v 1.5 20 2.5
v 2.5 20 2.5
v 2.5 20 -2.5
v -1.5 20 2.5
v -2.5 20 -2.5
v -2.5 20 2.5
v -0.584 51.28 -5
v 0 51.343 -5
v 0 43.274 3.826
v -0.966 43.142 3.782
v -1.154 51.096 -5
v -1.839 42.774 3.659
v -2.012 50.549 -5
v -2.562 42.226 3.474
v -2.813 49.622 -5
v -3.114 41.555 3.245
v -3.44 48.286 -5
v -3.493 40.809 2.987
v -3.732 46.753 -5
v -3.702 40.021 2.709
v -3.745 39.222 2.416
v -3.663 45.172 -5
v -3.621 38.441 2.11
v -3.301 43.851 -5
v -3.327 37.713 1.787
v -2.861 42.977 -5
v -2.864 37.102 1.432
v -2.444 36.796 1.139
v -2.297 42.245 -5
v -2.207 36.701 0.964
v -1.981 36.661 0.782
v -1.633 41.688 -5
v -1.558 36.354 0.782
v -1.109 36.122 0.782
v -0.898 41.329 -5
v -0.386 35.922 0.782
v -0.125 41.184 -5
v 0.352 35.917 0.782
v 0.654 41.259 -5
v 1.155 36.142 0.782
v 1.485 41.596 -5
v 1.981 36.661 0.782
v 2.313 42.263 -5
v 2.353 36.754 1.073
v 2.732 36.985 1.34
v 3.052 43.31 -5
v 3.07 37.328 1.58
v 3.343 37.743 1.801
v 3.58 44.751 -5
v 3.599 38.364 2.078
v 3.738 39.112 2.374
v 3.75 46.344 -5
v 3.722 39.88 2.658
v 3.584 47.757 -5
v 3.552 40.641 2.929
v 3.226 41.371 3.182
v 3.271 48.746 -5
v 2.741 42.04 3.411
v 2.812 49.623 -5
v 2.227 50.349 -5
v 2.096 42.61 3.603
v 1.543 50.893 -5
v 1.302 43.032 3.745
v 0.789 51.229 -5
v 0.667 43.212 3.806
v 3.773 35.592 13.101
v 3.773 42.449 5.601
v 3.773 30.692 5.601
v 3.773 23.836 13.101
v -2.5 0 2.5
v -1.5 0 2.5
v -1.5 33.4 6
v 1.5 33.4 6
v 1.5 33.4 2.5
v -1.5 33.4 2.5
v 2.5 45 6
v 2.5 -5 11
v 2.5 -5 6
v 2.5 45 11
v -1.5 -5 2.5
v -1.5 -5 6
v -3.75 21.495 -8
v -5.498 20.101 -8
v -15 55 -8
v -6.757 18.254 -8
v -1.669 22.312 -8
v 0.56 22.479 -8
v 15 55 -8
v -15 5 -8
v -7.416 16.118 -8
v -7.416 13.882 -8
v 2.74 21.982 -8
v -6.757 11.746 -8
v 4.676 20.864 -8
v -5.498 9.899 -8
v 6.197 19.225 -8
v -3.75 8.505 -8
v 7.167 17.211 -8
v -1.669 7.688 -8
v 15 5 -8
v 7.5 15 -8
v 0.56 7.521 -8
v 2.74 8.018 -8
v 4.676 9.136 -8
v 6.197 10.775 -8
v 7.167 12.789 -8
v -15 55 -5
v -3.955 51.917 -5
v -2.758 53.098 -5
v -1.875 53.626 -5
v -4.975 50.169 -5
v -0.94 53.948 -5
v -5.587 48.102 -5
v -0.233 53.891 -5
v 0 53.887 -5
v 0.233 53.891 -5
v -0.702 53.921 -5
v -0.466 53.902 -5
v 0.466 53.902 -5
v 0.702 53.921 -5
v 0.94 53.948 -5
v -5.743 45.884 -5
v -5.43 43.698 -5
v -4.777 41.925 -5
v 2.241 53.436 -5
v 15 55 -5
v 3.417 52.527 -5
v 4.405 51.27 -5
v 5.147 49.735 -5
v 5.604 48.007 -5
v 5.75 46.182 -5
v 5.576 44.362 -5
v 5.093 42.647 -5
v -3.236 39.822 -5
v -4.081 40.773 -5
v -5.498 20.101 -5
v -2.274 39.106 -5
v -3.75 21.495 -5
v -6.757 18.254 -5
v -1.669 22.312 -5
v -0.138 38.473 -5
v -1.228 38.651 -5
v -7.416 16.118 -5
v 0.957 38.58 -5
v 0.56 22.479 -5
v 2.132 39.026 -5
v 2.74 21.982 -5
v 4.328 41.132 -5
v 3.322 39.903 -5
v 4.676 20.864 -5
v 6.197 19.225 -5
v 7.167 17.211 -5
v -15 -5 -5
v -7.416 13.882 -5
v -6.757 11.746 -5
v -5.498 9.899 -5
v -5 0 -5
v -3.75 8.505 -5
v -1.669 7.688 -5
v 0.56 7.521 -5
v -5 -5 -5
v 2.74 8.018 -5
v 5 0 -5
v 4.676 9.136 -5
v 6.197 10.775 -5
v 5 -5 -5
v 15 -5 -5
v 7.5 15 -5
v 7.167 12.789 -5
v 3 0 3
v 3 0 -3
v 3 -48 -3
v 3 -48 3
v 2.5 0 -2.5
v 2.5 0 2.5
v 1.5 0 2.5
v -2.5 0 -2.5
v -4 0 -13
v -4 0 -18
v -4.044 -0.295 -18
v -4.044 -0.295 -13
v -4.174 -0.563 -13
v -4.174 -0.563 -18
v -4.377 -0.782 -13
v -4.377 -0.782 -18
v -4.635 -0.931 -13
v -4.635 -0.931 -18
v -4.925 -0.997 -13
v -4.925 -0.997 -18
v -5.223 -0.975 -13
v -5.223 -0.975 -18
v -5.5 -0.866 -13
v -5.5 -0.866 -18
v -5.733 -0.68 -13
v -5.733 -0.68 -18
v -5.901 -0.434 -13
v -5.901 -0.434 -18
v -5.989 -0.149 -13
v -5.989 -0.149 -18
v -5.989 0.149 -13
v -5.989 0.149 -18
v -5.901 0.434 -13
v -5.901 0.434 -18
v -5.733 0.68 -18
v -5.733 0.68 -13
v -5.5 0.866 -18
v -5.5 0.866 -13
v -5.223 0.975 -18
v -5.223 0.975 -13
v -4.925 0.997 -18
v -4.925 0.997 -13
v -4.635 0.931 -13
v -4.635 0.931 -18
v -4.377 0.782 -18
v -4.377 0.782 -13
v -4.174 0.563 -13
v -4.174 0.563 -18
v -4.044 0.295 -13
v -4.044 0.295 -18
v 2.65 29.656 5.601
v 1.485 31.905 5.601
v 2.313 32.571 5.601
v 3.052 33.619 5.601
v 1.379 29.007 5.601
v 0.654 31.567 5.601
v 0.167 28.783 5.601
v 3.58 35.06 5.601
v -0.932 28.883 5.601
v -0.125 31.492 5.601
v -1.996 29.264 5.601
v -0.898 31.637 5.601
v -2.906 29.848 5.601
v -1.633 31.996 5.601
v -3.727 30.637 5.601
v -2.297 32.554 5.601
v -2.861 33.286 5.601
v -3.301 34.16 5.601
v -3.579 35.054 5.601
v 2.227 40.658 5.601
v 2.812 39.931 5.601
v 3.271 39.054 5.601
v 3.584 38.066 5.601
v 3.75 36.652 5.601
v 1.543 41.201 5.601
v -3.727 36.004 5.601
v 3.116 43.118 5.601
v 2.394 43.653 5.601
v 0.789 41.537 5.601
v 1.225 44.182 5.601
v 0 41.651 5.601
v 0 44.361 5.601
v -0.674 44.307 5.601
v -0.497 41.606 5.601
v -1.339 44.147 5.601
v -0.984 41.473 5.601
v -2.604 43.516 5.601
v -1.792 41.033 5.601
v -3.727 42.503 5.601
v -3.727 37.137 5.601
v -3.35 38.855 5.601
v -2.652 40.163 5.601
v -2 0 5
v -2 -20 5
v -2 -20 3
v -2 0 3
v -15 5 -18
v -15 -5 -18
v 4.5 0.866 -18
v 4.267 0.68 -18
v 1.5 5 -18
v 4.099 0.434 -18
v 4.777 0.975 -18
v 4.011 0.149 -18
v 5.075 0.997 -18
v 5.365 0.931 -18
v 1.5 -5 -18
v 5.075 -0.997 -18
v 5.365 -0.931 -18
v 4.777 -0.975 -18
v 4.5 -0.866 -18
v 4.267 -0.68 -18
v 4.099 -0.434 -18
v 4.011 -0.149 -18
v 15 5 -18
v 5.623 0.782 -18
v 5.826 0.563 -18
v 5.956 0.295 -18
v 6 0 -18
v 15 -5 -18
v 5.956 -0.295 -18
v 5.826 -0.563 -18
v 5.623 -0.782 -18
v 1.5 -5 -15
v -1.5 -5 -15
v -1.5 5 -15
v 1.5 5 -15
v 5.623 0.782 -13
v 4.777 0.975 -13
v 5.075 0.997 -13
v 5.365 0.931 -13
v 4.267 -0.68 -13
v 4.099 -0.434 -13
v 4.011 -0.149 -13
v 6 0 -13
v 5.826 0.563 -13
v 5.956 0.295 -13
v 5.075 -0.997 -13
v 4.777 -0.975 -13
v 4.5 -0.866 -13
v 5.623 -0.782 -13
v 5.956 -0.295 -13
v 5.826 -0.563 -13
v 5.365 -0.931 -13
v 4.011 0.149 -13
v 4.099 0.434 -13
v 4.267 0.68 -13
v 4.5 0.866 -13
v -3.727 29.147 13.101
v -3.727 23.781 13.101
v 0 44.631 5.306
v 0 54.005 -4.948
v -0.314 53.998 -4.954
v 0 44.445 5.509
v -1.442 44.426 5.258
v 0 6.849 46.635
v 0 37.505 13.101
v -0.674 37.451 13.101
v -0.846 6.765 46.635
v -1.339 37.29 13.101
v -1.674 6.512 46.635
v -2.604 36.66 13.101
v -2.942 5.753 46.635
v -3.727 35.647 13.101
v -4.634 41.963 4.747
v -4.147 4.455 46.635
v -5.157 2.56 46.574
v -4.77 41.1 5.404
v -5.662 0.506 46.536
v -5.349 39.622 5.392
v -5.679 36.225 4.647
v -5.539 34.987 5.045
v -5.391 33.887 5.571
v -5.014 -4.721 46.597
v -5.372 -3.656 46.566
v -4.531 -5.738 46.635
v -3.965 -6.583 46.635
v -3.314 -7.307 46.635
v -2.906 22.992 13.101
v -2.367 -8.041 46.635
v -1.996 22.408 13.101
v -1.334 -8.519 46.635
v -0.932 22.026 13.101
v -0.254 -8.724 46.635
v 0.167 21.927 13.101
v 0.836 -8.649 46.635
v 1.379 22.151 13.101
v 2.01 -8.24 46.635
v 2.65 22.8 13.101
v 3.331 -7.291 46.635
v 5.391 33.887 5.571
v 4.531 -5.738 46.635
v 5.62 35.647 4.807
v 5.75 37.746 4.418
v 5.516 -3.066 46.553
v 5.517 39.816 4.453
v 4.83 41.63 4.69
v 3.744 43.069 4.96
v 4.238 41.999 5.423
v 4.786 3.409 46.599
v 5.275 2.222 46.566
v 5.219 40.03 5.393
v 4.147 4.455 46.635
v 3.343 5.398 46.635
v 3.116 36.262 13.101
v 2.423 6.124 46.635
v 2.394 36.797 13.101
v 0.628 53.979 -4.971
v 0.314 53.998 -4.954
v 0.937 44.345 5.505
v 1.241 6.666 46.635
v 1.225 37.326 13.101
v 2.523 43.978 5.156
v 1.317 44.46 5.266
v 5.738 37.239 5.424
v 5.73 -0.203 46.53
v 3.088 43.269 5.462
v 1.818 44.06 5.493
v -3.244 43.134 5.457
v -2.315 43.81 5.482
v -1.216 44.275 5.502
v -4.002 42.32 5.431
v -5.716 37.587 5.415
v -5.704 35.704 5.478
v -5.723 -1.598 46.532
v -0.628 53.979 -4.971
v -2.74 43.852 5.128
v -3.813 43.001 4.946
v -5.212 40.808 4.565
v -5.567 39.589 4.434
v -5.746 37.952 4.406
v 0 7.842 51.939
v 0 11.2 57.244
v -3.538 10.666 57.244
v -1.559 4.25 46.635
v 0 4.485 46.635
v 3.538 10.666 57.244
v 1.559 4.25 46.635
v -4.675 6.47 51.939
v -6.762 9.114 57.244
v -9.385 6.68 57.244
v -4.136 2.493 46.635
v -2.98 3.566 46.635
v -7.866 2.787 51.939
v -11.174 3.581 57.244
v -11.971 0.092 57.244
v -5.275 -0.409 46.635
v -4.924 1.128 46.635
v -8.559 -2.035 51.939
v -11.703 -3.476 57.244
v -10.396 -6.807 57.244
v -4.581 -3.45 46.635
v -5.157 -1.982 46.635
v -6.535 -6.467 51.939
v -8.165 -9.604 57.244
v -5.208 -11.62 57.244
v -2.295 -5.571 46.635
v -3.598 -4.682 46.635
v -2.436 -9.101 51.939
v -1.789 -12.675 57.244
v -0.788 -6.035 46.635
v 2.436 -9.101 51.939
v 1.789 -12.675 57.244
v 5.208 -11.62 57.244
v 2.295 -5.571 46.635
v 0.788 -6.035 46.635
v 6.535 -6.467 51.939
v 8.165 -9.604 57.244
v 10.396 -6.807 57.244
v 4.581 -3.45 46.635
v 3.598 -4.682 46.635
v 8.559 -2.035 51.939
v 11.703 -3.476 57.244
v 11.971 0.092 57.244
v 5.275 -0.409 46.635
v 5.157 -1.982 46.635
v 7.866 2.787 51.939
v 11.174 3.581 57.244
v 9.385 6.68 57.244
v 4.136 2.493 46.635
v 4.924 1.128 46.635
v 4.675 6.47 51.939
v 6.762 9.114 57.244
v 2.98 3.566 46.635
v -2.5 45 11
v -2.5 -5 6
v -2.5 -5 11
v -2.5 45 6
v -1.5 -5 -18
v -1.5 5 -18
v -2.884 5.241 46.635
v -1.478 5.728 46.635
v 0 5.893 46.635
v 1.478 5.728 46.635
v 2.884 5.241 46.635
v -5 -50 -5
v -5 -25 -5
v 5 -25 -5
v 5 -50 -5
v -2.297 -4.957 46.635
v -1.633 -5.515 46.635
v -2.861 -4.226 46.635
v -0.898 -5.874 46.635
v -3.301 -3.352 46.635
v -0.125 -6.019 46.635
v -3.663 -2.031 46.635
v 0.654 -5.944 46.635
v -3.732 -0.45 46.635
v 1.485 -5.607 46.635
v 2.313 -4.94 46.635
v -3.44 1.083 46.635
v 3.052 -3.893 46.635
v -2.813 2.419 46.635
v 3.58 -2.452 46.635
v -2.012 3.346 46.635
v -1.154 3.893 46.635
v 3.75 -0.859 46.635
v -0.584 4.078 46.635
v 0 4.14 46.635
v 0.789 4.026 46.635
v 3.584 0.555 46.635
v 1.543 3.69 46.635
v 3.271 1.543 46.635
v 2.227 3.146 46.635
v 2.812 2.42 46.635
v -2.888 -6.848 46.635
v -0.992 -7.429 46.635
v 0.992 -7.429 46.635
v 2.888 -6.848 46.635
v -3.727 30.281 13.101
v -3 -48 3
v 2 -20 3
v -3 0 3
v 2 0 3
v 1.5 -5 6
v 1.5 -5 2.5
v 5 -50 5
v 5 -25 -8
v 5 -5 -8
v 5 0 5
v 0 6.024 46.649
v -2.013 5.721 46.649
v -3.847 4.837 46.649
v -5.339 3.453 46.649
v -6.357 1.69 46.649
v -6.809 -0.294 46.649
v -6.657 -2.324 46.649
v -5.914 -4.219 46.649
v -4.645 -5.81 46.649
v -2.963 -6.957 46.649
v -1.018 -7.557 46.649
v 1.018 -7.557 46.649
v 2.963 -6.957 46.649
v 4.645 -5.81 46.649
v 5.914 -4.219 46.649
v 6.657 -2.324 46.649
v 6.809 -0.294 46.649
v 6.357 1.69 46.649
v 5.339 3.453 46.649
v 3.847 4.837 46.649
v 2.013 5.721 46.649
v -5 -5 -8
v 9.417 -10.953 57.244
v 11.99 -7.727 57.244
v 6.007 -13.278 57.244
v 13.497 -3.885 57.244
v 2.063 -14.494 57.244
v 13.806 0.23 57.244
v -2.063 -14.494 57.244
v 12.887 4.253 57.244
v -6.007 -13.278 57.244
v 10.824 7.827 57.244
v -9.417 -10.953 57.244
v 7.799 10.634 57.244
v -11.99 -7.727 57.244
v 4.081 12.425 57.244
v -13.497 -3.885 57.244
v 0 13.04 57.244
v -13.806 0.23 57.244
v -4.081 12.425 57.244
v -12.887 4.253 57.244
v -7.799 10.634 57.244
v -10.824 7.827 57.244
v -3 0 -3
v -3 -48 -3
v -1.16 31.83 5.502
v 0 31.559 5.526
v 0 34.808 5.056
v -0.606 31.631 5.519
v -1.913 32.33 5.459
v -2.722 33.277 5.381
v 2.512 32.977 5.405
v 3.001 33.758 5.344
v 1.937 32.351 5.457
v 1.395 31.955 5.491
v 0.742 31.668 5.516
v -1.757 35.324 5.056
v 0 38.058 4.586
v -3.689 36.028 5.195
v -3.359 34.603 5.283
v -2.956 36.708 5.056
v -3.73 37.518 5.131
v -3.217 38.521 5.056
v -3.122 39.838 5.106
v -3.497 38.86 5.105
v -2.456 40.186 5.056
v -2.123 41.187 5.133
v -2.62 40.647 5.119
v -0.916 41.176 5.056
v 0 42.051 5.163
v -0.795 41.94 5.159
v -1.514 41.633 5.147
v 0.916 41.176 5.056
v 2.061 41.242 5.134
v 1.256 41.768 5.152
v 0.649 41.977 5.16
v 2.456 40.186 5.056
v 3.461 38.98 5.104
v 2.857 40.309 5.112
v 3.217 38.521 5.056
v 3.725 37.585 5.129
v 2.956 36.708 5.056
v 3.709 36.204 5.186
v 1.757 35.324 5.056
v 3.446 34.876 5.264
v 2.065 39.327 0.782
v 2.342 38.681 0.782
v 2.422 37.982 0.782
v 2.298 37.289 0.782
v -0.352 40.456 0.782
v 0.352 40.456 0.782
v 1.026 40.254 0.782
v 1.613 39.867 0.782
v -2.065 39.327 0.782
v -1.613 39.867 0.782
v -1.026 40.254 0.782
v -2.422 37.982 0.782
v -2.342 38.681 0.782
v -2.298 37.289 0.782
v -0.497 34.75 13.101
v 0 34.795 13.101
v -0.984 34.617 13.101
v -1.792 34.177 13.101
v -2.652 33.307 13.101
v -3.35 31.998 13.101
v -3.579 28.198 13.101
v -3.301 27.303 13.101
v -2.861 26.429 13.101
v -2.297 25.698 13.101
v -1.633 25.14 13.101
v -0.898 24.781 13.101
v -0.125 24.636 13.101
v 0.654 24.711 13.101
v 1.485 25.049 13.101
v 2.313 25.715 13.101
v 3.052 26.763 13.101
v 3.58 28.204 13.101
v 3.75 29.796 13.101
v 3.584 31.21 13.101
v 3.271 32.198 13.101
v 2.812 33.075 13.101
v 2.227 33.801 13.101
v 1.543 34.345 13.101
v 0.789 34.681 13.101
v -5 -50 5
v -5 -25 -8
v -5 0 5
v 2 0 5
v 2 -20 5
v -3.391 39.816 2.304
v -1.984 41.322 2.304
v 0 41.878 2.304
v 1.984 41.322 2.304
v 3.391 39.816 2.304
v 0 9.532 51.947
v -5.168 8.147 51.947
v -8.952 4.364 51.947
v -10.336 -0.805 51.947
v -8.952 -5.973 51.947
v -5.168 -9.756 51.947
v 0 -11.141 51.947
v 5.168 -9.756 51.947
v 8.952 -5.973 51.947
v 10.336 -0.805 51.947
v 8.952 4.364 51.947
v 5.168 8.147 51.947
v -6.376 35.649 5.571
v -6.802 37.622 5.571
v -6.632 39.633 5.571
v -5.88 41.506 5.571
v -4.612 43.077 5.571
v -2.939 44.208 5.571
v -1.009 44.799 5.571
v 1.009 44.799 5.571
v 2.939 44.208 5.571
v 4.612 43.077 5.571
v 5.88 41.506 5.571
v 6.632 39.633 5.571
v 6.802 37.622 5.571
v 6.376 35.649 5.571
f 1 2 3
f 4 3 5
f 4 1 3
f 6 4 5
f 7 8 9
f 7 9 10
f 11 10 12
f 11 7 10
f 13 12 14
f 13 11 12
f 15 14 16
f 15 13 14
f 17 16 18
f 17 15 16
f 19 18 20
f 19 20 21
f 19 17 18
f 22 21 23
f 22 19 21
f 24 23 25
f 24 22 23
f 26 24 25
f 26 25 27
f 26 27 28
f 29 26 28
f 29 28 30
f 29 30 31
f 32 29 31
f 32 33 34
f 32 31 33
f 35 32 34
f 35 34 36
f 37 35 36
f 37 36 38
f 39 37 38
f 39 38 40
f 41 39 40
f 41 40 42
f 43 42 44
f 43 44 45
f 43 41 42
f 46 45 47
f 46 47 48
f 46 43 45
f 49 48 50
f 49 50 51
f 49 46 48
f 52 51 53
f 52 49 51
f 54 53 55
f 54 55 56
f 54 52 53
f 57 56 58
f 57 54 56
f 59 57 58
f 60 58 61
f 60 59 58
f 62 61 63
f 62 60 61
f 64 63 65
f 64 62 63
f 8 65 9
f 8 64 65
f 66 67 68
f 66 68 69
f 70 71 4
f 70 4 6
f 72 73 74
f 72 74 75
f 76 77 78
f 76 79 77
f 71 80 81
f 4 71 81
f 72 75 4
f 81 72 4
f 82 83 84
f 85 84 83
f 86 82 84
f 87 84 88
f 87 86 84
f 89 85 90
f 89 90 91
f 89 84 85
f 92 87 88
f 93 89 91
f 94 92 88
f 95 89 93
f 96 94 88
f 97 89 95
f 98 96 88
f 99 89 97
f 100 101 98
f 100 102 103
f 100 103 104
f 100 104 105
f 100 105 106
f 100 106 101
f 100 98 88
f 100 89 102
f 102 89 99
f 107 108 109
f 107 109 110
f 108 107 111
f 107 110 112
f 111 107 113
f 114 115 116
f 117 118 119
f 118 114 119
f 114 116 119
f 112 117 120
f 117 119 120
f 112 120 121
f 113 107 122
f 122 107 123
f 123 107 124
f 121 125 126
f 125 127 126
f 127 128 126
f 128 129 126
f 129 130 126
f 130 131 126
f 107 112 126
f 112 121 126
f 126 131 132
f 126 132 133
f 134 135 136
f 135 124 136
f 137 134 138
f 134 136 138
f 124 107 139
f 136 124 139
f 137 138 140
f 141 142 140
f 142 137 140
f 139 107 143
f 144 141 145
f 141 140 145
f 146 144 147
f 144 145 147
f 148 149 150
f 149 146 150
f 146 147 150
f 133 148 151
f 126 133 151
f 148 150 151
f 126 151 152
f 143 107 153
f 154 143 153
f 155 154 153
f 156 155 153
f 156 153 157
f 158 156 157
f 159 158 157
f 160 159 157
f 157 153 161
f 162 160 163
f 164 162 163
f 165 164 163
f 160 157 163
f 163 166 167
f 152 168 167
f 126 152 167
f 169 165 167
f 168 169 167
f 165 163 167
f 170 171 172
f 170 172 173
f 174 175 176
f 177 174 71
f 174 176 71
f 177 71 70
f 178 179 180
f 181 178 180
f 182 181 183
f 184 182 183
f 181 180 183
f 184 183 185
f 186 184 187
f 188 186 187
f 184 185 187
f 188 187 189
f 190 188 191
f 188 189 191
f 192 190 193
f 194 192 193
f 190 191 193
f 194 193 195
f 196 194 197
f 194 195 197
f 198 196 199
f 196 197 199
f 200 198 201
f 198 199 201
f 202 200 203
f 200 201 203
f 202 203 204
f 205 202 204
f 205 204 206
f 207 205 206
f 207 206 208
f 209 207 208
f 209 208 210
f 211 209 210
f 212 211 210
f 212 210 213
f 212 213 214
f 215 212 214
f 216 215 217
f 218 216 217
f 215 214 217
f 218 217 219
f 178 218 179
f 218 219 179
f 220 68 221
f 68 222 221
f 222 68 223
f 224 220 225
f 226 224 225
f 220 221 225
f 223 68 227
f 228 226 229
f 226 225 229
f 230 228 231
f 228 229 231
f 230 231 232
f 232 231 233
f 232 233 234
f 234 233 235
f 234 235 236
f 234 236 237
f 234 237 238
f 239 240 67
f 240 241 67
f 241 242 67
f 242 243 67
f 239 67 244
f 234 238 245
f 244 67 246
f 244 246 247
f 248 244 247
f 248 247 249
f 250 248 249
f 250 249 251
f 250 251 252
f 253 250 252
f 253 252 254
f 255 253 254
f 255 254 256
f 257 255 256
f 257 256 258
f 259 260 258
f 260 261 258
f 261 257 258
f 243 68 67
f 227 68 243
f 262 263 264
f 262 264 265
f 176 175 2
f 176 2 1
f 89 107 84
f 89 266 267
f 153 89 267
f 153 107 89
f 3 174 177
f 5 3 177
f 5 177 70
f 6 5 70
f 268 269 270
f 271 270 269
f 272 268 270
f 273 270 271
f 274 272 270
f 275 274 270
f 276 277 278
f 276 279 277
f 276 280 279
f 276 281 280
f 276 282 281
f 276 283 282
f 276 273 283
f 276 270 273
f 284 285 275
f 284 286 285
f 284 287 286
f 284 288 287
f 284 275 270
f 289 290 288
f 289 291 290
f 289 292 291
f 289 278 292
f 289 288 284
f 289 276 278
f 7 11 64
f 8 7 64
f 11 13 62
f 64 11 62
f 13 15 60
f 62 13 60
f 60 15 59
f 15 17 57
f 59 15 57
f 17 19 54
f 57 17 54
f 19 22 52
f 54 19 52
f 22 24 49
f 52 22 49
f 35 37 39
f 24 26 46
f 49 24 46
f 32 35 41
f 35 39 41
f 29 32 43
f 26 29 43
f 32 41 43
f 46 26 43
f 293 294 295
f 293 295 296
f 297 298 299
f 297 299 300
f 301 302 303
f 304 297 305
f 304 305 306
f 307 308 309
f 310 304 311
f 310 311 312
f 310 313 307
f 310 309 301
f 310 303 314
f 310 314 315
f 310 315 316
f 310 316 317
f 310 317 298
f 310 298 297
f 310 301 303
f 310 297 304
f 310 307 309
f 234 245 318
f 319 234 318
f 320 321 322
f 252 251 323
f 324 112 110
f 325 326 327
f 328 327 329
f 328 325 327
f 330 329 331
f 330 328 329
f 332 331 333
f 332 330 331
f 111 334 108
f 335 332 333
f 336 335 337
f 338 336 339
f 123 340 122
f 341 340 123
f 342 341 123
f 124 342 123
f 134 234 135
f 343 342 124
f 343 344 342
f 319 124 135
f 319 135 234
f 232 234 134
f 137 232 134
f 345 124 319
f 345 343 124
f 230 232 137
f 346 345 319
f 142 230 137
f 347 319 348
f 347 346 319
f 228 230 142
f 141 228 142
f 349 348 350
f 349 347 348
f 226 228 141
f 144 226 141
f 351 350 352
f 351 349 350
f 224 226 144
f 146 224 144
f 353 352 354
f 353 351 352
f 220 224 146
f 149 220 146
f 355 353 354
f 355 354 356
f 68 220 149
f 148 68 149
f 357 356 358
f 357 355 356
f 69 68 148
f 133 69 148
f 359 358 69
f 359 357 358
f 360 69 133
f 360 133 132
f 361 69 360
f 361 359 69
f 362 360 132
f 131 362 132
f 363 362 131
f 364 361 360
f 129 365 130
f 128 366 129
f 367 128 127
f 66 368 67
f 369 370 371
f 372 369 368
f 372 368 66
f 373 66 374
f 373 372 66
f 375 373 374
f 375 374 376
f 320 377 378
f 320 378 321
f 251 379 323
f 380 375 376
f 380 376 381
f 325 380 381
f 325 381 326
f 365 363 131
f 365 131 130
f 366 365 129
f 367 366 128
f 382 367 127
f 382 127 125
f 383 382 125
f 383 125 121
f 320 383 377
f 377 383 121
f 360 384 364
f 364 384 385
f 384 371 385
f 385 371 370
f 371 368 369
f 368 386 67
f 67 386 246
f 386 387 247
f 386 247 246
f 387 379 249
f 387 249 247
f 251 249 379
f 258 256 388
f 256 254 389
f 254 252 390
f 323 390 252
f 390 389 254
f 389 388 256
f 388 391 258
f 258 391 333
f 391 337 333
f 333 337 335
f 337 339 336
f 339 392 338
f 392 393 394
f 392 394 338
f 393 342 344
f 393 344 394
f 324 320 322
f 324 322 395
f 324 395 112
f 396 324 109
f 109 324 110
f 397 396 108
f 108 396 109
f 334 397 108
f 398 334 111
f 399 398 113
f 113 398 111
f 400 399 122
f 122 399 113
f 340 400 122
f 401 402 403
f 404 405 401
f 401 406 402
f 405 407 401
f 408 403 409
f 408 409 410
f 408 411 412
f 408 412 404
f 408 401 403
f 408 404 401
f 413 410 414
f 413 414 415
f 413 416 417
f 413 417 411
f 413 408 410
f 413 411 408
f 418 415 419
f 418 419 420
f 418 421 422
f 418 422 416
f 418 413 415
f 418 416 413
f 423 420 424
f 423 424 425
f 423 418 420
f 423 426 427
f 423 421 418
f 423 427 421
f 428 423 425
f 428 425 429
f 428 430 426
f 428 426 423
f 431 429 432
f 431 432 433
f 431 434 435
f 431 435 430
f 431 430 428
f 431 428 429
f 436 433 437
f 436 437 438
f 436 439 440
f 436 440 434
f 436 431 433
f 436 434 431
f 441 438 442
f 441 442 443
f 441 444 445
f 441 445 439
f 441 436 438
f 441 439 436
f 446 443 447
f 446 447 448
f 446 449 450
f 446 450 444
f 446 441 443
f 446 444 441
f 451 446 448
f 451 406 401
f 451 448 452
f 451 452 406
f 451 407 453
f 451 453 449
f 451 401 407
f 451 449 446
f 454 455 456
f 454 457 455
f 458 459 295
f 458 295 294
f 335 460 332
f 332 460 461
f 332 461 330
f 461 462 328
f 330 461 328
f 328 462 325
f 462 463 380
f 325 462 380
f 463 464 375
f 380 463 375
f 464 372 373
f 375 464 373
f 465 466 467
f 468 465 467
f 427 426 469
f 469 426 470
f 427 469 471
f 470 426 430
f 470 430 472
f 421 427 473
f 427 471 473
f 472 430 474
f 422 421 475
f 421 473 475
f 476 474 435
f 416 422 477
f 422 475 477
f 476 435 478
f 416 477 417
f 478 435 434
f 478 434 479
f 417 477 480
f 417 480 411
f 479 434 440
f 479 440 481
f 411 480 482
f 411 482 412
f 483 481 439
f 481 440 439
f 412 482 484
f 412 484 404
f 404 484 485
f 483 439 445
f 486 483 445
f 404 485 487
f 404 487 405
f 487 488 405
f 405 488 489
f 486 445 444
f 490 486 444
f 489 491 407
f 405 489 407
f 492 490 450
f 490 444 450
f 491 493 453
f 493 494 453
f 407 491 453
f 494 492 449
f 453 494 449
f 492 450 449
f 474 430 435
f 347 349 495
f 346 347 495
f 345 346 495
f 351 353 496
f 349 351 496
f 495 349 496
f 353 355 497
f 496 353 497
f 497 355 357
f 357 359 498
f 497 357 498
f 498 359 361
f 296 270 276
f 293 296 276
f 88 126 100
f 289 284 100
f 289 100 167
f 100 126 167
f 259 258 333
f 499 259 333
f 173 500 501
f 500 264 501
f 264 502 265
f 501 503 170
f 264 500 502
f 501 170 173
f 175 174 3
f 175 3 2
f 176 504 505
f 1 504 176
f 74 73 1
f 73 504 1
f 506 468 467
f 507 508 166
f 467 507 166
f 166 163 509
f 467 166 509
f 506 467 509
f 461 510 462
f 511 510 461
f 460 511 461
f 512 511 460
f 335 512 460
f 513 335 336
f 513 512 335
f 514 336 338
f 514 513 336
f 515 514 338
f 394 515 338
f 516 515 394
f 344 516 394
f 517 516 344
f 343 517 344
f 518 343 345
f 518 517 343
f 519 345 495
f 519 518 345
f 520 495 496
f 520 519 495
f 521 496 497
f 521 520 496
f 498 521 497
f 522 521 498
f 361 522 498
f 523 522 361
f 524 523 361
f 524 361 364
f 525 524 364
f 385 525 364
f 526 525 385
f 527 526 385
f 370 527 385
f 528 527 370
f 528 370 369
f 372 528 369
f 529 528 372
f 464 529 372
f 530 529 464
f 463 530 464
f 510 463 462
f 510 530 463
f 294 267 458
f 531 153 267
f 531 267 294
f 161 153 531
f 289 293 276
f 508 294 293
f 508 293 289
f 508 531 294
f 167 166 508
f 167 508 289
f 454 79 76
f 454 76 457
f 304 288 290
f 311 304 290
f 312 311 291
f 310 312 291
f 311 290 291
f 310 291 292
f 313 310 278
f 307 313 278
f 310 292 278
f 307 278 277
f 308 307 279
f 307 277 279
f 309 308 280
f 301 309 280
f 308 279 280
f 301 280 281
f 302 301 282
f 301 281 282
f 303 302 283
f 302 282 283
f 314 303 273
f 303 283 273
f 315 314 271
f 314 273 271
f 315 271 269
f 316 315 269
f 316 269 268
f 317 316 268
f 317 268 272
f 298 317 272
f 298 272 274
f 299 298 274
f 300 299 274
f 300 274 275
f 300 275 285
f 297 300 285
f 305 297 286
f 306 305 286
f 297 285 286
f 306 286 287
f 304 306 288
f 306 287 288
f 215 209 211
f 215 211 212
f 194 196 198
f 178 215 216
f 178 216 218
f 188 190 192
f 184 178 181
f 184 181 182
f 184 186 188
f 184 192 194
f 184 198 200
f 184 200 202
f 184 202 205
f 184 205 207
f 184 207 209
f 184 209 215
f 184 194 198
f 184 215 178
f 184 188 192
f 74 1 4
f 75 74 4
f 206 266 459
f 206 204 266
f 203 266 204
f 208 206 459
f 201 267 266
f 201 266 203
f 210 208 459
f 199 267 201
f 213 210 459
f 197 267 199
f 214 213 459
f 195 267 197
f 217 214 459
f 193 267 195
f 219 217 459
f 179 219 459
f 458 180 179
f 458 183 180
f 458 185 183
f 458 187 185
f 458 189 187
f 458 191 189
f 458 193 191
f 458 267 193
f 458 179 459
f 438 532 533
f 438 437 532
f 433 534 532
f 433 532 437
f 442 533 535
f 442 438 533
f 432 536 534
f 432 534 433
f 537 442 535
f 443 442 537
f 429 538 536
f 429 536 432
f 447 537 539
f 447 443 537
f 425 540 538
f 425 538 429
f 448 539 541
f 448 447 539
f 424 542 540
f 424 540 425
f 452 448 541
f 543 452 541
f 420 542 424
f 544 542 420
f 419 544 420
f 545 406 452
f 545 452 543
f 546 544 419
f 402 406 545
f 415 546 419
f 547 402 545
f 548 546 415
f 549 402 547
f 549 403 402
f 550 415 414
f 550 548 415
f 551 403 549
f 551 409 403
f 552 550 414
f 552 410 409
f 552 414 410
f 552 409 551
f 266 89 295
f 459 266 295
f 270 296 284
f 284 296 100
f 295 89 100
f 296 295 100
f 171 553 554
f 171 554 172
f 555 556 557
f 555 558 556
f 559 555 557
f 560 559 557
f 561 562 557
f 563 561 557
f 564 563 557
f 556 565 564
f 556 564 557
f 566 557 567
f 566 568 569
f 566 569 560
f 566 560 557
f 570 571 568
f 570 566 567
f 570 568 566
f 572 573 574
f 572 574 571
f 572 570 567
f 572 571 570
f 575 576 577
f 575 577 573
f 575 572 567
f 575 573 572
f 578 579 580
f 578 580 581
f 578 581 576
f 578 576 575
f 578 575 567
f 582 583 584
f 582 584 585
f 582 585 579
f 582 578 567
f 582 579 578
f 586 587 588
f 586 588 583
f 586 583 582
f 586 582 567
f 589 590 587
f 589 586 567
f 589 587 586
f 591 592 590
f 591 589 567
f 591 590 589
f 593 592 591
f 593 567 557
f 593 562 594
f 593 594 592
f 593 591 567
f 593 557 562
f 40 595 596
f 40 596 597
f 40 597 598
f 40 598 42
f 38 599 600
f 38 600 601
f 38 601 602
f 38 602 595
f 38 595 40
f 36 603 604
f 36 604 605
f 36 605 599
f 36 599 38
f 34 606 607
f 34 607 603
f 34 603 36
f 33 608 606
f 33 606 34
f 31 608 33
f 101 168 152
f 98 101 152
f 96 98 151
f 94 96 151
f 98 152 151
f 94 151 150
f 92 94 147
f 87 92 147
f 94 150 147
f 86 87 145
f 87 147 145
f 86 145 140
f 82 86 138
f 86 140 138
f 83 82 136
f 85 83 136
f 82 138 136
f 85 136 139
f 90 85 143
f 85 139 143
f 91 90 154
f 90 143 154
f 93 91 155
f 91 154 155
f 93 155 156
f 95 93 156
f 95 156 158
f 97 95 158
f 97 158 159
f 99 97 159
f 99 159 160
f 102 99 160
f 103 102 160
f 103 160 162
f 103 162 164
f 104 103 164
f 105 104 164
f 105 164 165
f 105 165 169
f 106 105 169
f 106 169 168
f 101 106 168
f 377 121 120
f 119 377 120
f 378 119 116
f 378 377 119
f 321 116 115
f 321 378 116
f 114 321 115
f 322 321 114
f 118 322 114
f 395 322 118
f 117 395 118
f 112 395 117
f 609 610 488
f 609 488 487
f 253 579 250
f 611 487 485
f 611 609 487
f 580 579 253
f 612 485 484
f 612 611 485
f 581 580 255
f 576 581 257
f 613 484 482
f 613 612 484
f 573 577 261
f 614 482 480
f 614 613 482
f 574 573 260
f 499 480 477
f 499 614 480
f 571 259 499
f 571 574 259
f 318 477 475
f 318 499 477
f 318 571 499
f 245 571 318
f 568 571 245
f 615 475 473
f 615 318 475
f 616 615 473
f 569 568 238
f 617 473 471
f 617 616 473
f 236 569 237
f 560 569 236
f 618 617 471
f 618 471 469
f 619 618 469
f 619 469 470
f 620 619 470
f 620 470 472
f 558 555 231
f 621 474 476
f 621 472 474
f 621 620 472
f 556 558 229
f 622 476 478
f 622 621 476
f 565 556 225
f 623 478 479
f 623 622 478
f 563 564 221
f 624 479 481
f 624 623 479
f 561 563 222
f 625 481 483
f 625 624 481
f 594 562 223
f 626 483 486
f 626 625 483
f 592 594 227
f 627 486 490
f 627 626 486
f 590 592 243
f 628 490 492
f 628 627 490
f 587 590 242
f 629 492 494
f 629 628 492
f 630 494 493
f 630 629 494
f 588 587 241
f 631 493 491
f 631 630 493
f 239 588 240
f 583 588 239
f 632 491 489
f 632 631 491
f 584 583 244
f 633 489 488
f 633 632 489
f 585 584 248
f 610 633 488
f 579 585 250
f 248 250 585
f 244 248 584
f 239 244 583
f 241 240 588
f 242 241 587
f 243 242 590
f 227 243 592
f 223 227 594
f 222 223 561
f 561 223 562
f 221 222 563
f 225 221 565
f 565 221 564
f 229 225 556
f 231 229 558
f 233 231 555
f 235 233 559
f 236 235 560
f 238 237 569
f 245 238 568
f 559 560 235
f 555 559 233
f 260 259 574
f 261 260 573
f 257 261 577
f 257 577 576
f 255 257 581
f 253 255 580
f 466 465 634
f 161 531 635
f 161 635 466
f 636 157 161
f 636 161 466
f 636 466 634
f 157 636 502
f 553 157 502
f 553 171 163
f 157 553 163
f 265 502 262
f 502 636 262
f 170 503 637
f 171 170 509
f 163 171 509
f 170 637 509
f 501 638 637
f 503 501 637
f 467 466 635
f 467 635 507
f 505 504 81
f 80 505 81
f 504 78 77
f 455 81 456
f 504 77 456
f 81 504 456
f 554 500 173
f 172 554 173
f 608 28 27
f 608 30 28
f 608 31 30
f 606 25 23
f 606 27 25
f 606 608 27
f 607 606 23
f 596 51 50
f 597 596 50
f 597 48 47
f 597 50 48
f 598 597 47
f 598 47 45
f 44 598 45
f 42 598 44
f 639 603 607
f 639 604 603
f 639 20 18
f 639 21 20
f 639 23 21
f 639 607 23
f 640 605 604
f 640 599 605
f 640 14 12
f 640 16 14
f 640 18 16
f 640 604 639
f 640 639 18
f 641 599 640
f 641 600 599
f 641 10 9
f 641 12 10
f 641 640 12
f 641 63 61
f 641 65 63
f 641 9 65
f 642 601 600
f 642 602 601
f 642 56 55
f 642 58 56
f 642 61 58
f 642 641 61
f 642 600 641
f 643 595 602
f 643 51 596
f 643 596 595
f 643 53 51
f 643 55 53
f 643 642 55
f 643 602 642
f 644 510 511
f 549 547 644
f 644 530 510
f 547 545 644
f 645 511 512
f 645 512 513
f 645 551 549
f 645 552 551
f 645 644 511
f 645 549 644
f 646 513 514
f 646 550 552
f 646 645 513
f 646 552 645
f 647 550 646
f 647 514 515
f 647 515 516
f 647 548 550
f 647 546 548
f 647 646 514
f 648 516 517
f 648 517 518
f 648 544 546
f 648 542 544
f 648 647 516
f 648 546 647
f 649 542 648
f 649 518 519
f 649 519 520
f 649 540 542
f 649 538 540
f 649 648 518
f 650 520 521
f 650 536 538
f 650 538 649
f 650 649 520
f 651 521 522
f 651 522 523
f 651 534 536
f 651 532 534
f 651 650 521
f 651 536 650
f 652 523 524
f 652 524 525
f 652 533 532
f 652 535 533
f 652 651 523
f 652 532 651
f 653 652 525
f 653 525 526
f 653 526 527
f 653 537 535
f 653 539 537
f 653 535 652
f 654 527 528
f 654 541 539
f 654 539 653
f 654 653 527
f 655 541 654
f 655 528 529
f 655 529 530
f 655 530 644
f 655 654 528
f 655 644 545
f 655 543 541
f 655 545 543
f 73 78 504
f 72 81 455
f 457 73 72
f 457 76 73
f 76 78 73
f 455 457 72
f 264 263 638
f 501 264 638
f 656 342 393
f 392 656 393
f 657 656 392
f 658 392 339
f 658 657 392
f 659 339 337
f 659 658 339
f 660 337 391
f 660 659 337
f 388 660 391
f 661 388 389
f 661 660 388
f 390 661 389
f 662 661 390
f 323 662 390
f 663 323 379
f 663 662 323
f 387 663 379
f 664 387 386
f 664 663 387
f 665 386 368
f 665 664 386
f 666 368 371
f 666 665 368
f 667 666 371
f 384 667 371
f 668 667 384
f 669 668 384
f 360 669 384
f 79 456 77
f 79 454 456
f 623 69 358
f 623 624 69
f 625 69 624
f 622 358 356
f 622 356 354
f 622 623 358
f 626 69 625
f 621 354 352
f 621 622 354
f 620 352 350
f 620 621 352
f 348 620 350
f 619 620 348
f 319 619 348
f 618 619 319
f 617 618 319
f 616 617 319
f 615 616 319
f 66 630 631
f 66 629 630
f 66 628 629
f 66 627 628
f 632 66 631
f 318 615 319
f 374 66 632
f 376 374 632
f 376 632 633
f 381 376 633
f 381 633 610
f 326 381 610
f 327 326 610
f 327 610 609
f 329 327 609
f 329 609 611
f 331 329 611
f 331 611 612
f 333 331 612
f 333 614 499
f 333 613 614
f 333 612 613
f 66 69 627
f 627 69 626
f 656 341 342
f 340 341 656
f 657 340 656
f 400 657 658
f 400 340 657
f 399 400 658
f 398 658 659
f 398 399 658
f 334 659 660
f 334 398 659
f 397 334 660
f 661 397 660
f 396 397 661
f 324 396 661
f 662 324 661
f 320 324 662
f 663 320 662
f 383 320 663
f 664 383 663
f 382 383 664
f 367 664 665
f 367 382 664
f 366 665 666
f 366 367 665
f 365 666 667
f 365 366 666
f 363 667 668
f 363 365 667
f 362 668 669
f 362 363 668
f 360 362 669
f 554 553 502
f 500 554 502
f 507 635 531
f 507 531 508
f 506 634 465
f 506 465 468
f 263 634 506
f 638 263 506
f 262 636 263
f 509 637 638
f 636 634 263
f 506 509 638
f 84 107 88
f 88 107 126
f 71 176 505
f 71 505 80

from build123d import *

# Parameters (mm, degrees)
F0_W          = 10
F0_H          = 10
F0_W_2        = 6
F0_H_2        = 6
F1_DEPTH      = 50
F2_W          = 4
F2_H          = 20
F3_DEPTH      = 3
F4_W          = 5
F4_H          = 5
F5_DEPTH      = 20
F7_DEPTH      = 25
F7_DEPTH_BACK = 25
F8_W          = 30
F8_H          = 80
F9_DEPTH      = 3
F10_R         = 7.5
F11_DEPTH     = 3.001
F12_W         = 30
F12_H         = 10
F13_DEPTH     = 10
F14_W         = 3
F14_H         = 10
F15_DEPTH     = 3
F16_R         = 1
F17_DEPTH     = 5
F18_W         = 6
F18_H         = 6
F19_DEPTH     = 2
F20_W         = 10
F20_H         = 20
F21_DEPTH     = 25
F25_W         = 7.5
F25_H         = 7.5
F26_DEPTH     = 33.5
F27_W         = 3
F27_H         = 3.5
F28_DEPTH     = 11.6
F29_W         = 34.4351846725
F29_H         = 17.5250470638
F30_DEPTH     = 605
F33_W         = 16.5032114089
F33_H         = 5.4589001536
F34_DEPTH     = 25


with BuildPart() as f1:
    # F0 (on Front) → F1 (new body)
    with BuildSketch(Plane.XZ):
        Rectangle(F0_W, F0_H)
        Rectangle(F0_W_2, F0_H_2, mode=Mode.SUBTRACT)
    extrude(amount=F1_DEPTH)

    # F2 (on face) → F3 (cut)
    with BuildSketch(Plane.XY.offset(5)):
        with Locations((0, -10)):
            Rectangle(F2_W, F2_H)
    extrude(amount=-F3_DEPTH, mode=Mode.SUBTRACT)

    # F8 (on face) → F9 (join)
    with BuildSketch(Plane(origin=(0, 0, -5), x_dir=(1, 0, 0), z_dir=(0, 0, -1))):
        with Locations((0, -15)):
            Rectangle(F8_W, F8_H)
    extrude(amount=F9_DEPTH)

    # F10 (on face) → F11 (cut, through all)
    with BuildSketch(Plane.XY.offset(-5)):
        with Locations((0, 15)):
            Circle(F10_R)
    extrude(amount=-F11_DEPTH, mode=Mode.SUBTRACT)

    # F12 (on face) → F13 (join)
    with BuildSketch(Plane(origin=(0, 0, -8), x_dir=(1, 0, 0), z_dir=(0, 0, -1))):
        Rectangle(F12_W, F12_H)
    extrude(amount=F13_DEPTH)

    # F14 (on face) → F15 (cut)
    with BuildSketch(Plane(origin=(0, 0, -18), x_dir=(1, 0, 0), z_dir=(0, 0, -1))):
        Rectangle(F14_W, F14_H)
    extrude(amount=-F15_DEPTH, mode=Mode.SUBTRACT)

    # F16 (on face) → F17 (cut)
    with BuildSketch(Plane(origin=(0, 0, -18), x_dir=(1, 0, 0), z_dir=(0, 0, -1))):
        with Locations((-5, 0)):
            Circle(F16_R)
        with Locations((5, 0)):
            Circle(F16_R)
    extrude(amount=-F17_DEPTH, mode=Mode.SUBTRACT)

    # F18 (on face) → F19 (join)
    with BuildSketch(Plane.XZ.offset(50)):
        Rectangle(F18_W, F18_H)
    extrude(amount=-F19_DEPTH)

    # F20 (on face) → F21 (cut)
    with BuildSketch(Plane.XY.offset(-5)):
        with Locations((-10, -15)):
            Rectangle(F20_W, F20_H)
        with Locations((10, -15)):
            Rectangle(F20_W, F20_H)
    extrude(amount=-F21_DEPTH, mode=Mode.SUBTRACT)

    # F22 (on Right) → F23 (revolve)
    with BuildSketch(Plane.YZ):
        Polygon((-2.0557420257, 53.4116236296), (52.0781588757, -5.8047241393), (54.0045872331, -4.9478402361), (-0.5796004863, 54.7610702405), align=None)
    revolve(axis=Axis((0, 22.938336782, 20.5131024087), (0, -0.6747233055, 0.7380707697)))

    # F25 (on offset) → F26 (cut)
    with BuildSketch(Plane(origin=(0, 55, 0), x_dir=(-1, 0, 0), z_dir=(0, 1, 0))):
        with Locations((-0.0233930768, 9.3513107755)):
            Rectangle(F25_W, F25_H)
    extrude(amount=-F26_DEPTH, mode=Mode.SUBTRACT)

    # F29 (on Right) → F30 (cut, symmetric)
    with BuildSketch(Plane.YZ):
        with Locations((-0.082434155, 55.3970336914)):
            Rectangle(F29_W, F29_H)
    extrude(amount=F30_DEPTH, both=True, mode=Mode.SUBTRACT)

    # F31 (on Right) → F32 (revolve)
    with BuildSketch(Plane.YZ):
        Polygon((11.19965408, 57.2443678975), (4.3785599992, 46.4661866426), (6.0238954611, 46.6490015388), (13.0396680906, 57.2443678975), align=None)
    revolve(axis=Axis((0, -0.8046502189, 52.2255096585), (0, 0, 1)))

    # F33 (on face) → F34 (cut)
    with BuildSketch(Plane.YZ.offset(15)):
        with Locations((46.7483942956, -10.7294500768)):
            Rectangle(F33_W, F33_H)
    extrude(amount=-F34_DEPTH, mode=Mode.SUBTRACT)

    # F35 (on Right) → F36 (revolve)
    with BuildSketch(Plane.YZ):
        Polygon((31.2420167029, 5.5713723414), (35.6345362961, 0.7823074702), (38.0581617355, 0.7823074702), (38.0581617355, 4.5863807123), align=None)
    revolve(axis=Axis((0, 38.0581617355, 2.6843440912), (0, 0, -1)))


with BuildPart() as f5:
    # F4 (on face) → F5 (new body)
    with BuildSketch(Plane(origin=(0, 0, 0), x_dir=(-1, 0, 0), z_dir=(0, 1, 0))):
        Rectangle(F4_W, F4_H)
    extrude(amount=F5_DEPTH)

    # F6 (on face) → F7 (join, two sides)
    with BuildSketch(Plane(origin=(0, 20, 0), x_dir=(-1, 0, 0), z_dir=(0, 1, 0))) as f7_sk:
        Polygon((-2.5, 11), (-2.5, 6), (-1.5, 6), (-1.5, 2.5), (1.5, 2.5), (1.5, 6), (2.5, 6), (2.5, 11), align=None)
    extrude(amount=F7_DEPTH)
    extrude(f7_sk.sketch, amount=-F7_DEPTH_BACK)

    # F27 (on face) → F28 (cut)
    with BuildSketch(Plane(origin=(0, 45, 0), x_dir=(-1, 0, 0), z_dir=(0, 1, 0))):
        with Locations((0, 4.25)):
            Rectangle(F27_W, F27_H)
    extrude(amount=-F28_DEPTH, mode=Mode.SUBTRACT)


solid = Compound([f1.part, f5.part])
